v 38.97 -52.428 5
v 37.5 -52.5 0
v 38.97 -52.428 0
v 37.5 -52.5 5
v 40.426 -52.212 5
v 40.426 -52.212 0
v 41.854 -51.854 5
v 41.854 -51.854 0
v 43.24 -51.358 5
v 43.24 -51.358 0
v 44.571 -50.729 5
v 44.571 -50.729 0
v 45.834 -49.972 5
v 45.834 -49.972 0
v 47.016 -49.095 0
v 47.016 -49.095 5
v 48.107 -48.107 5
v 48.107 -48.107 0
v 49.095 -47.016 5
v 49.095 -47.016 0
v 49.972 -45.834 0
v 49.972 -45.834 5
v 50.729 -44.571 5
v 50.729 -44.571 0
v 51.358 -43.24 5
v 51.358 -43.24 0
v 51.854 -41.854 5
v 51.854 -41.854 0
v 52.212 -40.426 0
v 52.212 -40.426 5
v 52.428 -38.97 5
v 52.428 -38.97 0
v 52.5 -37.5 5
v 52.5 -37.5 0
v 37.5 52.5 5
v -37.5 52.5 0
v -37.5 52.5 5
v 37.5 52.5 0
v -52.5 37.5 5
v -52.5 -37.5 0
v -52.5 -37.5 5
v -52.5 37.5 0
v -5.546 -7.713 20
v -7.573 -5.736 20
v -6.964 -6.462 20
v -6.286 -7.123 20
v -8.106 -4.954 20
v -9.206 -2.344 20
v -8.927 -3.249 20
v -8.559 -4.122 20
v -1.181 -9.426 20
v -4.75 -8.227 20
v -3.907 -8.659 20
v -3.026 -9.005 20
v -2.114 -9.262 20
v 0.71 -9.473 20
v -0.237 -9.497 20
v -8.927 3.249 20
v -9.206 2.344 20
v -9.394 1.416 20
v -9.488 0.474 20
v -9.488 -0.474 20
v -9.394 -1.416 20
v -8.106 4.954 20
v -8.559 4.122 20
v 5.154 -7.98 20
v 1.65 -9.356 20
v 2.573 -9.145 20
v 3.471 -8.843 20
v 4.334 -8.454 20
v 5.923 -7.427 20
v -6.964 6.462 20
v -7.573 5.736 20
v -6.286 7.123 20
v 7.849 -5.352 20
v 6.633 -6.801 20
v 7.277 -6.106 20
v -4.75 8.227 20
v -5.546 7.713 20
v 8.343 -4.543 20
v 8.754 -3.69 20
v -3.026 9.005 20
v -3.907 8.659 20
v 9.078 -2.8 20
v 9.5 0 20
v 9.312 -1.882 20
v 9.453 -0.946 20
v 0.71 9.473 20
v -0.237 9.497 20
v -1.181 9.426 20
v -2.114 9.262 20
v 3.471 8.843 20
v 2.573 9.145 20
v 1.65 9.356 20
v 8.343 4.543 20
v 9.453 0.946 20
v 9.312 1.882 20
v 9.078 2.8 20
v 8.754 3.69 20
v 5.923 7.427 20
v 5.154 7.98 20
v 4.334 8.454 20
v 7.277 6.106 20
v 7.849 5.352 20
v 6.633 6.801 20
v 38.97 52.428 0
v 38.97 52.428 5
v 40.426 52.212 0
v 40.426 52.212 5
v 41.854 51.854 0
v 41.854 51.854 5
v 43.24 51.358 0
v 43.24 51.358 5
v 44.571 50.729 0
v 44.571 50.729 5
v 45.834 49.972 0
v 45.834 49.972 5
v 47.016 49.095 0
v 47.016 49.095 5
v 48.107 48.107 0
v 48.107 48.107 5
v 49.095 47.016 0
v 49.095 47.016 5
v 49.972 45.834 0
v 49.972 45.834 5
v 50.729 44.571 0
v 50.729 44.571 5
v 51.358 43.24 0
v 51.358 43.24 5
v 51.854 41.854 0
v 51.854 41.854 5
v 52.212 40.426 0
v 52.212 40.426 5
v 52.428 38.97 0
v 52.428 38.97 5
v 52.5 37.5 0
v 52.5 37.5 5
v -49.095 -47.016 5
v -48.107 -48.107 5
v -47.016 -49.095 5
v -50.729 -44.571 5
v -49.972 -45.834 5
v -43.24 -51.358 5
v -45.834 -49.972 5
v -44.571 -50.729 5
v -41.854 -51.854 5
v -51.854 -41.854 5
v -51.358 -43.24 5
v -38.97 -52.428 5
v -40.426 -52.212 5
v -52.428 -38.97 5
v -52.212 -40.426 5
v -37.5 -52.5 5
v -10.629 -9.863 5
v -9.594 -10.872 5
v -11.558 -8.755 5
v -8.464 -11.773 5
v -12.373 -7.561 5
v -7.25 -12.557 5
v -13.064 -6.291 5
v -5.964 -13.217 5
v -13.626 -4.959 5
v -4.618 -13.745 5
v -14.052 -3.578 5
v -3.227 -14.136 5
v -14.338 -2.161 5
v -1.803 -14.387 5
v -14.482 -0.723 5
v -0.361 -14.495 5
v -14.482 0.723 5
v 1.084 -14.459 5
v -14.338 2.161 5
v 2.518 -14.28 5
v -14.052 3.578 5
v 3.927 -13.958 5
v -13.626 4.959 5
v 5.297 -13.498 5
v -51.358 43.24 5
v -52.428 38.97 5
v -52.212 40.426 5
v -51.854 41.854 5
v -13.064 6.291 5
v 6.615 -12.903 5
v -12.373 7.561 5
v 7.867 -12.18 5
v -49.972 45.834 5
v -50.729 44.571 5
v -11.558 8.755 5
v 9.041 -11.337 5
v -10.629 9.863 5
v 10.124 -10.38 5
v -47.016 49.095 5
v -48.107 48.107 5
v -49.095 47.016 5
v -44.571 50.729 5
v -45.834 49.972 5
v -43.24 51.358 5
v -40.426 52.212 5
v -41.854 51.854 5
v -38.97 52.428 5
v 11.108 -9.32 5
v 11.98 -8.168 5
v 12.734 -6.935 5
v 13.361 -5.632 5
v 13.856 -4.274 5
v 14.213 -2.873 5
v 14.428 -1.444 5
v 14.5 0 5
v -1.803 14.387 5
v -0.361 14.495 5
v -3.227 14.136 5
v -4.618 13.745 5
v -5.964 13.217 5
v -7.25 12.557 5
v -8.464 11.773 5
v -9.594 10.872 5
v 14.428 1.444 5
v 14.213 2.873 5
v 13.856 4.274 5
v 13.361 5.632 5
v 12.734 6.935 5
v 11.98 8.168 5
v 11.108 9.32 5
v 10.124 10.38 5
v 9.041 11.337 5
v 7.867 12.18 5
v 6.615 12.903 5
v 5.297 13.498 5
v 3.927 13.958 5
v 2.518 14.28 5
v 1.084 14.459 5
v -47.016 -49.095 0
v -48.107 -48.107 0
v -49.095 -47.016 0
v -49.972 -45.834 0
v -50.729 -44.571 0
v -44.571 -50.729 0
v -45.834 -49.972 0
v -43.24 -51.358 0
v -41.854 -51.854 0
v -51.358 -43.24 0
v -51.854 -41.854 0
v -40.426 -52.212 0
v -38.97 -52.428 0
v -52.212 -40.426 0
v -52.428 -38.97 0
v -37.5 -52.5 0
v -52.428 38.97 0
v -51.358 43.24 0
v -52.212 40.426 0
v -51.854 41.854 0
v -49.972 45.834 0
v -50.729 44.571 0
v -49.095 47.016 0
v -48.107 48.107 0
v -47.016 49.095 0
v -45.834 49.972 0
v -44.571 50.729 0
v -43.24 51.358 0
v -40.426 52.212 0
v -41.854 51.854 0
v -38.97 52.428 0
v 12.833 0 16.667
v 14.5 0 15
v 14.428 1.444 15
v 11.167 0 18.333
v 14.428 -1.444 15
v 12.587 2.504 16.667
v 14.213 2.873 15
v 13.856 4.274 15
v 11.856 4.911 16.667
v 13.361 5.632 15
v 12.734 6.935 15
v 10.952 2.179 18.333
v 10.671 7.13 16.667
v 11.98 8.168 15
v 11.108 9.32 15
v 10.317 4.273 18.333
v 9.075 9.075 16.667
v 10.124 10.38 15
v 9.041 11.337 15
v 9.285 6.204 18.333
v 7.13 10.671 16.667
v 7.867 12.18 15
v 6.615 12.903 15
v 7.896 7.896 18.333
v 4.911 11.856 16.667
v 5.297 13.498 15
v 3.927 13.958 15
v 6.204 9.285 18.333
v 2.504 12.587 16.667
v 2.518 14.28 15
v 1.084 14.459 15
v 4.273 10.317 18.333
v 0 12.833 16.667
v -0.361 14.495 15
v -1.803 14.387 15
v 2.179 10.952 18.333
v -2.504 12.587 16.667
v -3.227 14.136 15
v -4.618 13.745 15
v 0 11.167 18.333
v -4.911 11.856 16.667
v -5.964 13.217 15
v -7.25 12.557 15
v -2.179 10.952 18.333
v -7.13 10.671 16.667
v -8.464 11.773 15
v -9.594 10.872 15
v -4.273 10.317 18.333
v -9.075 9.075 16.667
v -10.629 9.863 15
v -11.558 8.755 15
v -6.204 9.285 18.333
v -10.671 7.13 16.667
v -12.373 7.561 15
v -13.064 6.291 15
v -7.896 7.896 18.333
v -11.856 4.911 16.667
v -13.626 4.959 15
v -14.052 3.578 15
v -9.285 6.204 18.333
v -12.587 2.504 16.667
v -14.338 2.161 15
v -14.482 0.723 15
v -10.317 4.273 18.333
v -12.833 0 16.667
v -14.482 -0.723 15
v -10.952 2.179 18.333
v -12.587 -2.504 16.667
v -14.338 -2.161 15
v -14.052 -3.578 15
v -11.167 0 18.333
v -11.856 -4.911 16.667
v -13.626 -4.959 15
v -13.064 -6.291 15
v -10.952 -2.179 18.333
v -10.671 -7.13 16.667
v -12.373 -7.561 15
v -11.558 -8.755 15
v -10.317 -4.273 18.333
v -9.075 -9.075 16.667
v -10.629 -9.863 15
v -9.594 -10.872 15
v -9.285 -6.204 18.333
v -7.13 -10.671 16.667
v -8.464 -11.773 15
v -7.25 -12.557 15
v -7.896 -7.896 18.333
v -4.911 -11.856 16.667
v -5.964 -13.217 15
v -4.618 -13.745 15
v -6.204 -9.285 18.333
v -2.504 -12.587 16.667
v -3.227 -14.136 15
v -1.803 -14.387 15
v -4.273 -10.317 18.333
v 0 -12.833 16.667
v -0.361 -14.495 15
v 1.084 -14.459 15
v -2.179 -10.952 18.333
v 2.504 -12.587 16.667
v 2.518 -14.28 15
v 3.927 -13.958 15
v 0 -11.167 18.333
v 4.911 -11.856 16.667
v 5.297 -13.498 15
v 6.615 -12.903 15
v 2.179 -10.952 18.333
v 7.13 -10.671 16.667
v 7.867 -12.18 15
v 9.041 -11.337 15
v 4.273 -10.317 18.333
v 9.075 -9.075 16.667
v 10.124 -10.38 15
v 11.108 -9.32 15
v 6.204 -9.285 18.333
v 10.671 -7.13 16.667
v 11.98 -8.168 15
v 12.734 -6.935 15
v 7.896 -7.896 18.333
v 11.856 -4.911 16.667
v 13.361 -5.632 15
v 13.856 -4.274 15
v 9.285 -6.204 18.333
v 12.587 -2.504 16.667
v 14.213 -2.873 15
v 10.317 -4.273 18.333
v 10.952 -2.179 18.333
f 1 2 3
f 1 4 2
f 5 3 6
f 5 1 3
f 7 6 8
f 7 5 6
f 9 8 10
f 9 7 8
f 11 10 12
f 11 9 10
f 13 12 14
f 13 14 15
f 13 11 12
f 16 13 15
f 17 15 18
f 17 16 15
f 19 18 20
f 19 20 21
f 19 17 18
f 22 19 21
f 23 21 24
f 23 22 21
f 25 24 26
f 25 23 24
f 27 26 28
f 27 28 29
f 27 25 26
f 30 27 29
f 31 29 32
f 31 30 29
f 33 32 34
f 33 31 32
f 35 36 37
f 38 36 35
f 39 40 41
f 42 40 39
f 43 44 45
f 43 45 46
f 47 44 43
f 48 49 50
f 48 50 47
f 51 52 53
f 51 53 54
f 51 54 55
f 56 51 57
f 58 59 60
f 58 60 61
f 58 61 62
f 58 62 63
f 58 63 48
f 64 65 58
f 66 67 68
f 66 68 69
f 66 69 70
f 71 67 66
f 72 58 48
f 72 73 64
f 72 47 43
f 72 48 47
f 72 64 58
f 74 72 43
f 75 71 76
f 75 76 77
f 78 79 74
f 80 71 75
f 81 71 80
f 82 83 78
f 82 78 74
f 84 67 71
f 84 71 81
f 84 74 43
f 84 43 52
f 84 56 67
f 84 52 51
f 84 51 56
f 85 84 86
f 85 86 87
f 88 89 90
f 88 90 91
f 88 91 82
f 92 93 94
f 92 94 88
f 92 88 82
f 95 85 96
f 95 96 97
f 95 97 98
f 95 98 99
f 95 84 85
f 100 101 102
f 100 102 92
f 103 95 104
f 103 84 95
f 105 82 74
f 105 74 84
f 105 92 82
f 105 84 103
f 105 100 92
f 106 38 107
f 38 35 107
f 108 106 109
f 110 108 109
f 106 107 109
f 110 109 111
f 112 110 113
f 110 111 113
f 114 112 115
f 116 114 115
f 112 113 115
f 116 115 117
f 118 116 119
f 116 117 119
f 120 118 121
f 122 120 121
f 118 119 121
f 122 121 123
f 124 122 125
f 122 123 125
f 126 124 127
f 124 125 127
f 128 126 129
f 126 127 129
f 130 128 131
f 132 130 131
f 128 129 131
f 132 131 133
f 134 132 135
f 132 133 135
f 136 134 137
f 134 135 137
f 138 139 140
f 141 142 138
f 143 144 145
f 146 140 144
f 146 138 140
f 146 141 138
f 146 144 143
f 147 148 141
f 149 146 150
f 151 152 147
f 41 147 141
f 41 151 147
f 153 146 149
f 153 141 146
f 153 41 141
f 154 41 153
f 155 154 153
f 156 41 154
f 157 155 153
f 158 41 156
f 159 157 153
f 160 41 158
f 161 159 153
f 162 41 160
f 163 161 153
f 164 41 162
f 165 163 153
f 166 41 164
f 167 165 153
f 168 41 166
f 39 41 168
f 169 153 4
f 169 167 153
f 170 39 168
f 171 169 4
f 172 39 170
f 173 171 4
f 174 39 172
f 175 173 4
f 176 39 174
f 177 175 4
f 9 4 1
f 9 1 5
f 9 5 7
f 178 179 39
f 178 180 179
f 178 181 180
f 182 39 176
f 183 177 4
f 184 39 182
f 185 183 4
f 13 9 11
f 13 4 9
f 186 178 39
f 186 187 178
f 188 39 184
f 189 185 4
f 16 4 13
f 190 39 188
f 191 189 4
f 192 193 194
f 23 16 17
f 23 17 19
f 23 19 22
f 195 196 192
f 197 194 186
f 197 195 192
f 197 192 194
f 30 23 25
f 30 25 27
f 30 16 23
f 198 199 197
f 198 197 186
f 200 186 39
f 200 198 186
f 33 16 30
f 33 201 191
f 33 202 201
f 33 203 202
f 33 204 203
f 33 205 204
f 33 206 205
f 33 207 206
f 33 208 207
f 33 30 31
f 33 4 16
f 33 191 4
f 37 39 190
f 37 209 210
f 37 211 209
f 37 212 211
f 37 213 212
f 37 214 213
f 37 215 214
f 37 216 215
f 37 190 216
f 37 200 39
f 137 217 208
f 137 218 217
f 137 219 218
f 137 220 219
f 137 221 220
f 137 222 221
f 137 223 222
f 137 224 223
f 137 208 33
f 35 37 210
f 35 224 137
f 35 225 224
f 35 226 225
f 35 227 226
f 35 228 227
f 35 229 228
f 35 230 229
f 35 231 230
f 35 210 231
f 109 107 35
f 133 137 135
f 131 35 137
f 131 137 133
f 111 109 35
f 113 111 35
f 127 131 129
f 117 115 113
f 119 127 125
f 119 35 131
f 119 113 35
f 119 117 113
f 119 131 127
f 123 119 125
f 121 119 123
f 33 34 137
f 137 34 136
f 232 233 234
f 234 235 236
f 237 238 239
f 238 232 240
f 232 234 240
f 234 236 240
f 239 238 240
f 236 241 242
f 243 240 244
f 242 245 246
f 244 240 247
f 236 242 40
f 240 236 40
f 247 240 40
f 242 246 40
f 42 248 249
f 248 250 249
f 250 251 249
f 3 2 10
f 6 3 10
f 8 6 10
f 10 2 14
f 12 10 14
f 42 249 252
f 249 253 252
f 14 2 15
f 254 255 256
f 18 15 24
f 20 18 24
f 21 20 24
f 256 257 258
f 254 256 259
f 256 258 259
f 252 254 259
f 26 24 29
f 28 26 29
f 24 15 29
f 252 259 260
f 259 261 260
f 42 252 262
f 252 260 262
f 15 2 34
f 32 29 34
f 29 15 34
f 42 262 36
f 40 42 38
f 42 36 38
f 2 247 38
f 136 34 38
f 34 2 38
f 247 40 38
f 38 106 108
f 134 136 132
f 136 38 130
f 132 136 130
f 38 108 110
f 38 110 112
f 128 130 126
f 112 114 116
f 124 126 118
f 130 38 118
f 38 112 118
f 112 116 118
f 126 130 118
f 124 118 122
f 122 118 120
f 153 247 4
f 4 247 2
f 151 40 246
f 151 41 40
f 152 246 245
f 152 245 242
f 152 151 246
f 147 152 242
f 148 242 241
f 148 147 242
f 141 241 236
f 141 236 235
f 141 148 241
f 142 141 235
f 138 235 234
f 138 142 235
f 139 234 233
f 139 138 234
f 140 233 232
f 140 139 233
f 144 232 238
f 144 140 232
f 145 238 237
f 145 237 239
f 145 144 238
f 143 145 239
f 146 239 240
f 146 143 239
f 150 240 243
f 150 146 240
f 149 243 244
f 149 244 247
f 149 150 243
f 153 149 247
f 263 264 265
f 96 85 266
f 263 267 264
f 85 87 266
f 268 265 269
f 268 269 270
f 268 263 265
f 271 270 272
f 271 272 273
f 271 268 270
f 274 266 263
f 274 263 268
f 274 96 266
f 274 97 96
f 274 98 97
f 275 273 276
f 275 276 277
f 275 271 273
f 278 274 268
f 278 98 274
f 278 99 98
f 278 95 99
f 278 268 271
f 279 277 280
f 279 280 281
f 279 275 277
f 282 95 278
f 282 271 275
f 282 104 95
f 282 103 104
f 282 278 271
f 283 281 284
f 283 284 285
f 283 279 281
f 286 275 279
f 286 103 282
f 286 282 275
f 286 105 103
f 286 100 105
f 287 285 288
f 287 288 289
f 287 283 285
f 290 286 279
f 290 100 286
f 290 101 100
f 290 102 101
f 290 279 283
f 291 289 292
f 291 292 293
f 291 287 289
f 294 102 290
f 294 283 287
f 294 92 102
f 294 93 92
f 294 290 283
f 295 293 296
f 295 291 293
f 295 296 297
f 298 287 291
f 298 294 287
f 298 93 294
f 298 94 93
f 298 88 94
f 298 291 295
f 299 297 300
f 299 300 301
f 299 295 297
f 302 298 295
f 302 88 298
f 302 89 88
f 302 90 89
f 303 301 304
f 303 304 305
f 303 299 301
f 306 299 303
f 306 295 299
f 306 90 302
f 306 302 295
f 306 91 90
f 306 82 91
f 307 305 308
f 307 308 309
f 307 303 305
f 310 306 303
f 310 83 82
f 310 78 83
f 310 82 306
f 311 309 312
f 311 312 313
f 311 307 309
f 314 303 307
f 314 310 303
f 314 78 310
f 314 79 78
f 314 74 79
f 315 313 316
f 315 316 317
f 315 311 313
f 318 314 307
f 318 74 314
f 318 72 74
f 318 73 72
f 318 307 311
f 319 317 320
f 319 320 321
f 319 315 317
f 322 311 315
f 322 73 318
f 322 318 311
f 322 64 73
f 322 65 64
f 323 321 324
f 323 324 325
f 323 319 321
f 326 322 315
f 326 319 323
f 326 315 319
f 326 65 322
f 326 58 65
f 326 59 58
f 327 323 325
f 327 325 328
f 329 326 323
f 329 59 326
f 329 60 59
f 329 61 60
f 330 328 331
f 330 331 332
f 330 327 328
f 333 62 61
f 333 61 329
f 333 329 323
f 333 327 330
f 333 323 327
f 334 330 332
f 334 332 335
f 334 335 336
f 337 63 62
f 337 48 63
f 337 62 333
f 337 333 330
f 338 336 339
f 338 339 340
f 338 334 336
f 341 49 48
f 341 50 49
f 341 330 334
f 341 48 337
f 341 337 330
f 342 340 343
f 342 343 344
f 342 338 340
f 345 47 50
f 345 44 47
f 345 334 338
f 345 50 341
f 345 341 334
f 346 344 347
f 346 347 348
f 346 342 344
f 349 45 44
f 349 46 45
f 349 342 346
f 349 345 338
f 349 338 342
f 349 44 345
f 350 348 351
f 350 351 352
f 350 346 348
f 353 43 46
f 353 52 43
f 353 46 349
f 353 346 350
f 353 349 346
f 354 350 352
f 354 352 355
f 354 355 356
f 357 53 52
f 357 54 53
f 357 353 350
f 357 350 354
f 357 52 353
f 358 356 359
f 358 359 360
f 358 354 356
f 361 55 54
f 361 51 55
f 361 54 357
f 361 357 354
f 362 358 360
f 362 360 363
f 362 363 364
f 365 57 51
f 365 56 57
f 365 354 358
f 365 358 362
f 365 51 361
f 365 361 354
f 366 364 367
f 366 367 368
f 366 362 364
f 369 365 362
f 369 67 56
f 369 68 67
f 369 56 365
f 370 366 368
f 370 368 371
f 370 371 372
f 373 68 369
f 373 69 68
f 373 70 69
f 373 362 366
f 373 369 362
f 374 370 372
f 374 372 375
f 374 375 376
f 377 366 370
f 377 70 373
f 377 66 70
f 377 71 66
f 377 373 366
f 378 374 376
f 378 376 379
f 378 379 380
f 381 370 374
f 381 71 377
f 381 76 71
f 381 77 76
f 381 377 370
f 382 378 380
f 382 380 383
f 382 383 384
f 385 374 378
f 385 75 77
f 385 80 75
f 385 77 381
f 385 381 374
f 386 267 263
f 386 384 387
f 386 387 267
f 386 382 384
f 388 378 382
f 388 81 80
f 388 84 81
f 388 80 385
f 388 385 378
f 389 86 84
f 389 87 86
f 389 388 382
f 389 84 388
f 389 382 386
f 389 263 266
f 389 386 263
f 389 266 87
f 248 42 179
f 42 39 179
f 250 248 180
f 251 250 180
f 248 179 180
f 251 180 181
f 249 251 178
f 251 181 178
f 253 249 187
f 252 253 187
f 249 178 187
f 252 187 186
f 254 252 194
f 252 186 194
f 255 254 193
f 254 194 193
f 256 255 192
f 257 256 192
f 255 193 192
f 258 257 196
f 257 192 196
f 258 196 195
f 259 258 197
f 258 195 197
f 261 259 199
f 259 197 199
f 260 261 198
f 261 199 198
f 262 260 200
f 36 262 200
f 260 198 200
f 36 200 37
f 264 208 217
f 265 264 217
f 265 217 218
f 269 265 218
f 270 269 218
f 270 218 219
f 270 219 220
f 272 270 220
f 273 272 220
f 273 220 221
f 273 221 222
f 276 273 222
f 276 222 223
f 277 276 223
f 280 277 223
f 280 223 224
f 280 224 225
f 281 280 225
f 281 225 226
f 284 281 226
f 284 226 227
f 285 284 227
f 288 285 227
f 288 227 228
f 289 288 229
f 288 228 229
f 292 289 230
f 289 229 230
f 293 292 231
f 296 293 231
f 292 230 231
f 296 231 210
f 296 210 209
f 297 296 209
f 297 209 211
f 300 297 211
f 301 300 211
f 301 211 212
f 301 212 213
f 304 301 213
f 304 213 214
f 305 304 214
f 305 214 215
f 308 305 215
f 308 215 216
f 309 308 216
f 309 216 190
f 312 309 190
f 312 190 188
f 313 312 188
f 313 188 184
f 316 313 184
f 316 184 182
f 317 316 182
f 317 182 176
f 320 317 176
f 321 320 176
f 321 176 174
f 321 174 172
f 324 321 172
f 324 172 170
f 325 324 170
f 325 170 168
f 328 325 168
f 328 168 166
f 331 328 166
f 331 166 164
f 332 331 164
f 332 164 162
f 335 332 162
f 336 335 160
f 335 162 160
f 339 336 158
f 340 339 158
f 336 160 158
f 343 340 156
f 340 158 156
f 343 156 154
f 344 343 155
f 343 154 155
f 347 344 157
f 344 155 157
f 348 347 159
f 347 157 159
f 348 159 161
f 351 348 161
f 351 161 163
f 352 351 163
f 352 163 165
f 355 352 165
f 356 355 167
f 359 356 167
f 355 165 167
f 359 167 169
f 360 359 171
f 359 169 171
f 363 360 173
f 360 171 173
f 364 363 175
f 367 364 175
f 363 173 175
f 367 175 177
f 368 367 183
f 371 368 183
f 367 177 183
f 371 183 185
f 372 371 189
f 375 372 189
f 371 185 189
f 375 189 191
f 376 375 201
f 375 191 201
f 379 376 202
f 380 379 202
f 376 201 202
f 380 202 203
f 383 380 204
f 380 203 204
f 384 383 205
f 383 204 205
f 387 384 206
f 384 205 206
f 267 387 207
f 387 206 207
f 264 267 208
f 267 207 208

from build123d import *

# Parameters (mm, degrees)
F0_R     = 14.5
F1_DEPTH = 20
F0_W     = 105
F0_H     = 105
F2_DEPTH = 5
F3_R     = 15
F4_SIZE  = 5


with BuildPart() as f1:
    # F0 (on Top) → F1 (new body)
    with BuildSketch(Plane.XY):
        Circle(F0_R)
    extrude(amount=F1_DEPTH)

    # F0 (on Top) → F2 (join)
    with BuildSketch(Plane.XY):
        Rectangle(F0_W, F0_H)
        Circle(F0_R, mode=Mode.SUBTRACT)
    extrude(amount=F2_DEPTH)

    # F3
    f3_edges = [f1.edges().sort_by_distance(p)[0] for p in [
        (52.5, -52.5, 2.5),
        (-52.5, -52.5, 2.5),
        (-52.5, 52.5, 2.5),
        (52.5, 52.5, 2.5),
    ]]
    fillet(f3_edges, radius=F3_R)

    # F4
    f4_edges = [f1.edges().sort_by_distance(p)[0] for p in [
        (-14.5, 0, 20),
    ]]
    chamfer(f4_edges, length=F4_SIZE)


solid = f1.part
